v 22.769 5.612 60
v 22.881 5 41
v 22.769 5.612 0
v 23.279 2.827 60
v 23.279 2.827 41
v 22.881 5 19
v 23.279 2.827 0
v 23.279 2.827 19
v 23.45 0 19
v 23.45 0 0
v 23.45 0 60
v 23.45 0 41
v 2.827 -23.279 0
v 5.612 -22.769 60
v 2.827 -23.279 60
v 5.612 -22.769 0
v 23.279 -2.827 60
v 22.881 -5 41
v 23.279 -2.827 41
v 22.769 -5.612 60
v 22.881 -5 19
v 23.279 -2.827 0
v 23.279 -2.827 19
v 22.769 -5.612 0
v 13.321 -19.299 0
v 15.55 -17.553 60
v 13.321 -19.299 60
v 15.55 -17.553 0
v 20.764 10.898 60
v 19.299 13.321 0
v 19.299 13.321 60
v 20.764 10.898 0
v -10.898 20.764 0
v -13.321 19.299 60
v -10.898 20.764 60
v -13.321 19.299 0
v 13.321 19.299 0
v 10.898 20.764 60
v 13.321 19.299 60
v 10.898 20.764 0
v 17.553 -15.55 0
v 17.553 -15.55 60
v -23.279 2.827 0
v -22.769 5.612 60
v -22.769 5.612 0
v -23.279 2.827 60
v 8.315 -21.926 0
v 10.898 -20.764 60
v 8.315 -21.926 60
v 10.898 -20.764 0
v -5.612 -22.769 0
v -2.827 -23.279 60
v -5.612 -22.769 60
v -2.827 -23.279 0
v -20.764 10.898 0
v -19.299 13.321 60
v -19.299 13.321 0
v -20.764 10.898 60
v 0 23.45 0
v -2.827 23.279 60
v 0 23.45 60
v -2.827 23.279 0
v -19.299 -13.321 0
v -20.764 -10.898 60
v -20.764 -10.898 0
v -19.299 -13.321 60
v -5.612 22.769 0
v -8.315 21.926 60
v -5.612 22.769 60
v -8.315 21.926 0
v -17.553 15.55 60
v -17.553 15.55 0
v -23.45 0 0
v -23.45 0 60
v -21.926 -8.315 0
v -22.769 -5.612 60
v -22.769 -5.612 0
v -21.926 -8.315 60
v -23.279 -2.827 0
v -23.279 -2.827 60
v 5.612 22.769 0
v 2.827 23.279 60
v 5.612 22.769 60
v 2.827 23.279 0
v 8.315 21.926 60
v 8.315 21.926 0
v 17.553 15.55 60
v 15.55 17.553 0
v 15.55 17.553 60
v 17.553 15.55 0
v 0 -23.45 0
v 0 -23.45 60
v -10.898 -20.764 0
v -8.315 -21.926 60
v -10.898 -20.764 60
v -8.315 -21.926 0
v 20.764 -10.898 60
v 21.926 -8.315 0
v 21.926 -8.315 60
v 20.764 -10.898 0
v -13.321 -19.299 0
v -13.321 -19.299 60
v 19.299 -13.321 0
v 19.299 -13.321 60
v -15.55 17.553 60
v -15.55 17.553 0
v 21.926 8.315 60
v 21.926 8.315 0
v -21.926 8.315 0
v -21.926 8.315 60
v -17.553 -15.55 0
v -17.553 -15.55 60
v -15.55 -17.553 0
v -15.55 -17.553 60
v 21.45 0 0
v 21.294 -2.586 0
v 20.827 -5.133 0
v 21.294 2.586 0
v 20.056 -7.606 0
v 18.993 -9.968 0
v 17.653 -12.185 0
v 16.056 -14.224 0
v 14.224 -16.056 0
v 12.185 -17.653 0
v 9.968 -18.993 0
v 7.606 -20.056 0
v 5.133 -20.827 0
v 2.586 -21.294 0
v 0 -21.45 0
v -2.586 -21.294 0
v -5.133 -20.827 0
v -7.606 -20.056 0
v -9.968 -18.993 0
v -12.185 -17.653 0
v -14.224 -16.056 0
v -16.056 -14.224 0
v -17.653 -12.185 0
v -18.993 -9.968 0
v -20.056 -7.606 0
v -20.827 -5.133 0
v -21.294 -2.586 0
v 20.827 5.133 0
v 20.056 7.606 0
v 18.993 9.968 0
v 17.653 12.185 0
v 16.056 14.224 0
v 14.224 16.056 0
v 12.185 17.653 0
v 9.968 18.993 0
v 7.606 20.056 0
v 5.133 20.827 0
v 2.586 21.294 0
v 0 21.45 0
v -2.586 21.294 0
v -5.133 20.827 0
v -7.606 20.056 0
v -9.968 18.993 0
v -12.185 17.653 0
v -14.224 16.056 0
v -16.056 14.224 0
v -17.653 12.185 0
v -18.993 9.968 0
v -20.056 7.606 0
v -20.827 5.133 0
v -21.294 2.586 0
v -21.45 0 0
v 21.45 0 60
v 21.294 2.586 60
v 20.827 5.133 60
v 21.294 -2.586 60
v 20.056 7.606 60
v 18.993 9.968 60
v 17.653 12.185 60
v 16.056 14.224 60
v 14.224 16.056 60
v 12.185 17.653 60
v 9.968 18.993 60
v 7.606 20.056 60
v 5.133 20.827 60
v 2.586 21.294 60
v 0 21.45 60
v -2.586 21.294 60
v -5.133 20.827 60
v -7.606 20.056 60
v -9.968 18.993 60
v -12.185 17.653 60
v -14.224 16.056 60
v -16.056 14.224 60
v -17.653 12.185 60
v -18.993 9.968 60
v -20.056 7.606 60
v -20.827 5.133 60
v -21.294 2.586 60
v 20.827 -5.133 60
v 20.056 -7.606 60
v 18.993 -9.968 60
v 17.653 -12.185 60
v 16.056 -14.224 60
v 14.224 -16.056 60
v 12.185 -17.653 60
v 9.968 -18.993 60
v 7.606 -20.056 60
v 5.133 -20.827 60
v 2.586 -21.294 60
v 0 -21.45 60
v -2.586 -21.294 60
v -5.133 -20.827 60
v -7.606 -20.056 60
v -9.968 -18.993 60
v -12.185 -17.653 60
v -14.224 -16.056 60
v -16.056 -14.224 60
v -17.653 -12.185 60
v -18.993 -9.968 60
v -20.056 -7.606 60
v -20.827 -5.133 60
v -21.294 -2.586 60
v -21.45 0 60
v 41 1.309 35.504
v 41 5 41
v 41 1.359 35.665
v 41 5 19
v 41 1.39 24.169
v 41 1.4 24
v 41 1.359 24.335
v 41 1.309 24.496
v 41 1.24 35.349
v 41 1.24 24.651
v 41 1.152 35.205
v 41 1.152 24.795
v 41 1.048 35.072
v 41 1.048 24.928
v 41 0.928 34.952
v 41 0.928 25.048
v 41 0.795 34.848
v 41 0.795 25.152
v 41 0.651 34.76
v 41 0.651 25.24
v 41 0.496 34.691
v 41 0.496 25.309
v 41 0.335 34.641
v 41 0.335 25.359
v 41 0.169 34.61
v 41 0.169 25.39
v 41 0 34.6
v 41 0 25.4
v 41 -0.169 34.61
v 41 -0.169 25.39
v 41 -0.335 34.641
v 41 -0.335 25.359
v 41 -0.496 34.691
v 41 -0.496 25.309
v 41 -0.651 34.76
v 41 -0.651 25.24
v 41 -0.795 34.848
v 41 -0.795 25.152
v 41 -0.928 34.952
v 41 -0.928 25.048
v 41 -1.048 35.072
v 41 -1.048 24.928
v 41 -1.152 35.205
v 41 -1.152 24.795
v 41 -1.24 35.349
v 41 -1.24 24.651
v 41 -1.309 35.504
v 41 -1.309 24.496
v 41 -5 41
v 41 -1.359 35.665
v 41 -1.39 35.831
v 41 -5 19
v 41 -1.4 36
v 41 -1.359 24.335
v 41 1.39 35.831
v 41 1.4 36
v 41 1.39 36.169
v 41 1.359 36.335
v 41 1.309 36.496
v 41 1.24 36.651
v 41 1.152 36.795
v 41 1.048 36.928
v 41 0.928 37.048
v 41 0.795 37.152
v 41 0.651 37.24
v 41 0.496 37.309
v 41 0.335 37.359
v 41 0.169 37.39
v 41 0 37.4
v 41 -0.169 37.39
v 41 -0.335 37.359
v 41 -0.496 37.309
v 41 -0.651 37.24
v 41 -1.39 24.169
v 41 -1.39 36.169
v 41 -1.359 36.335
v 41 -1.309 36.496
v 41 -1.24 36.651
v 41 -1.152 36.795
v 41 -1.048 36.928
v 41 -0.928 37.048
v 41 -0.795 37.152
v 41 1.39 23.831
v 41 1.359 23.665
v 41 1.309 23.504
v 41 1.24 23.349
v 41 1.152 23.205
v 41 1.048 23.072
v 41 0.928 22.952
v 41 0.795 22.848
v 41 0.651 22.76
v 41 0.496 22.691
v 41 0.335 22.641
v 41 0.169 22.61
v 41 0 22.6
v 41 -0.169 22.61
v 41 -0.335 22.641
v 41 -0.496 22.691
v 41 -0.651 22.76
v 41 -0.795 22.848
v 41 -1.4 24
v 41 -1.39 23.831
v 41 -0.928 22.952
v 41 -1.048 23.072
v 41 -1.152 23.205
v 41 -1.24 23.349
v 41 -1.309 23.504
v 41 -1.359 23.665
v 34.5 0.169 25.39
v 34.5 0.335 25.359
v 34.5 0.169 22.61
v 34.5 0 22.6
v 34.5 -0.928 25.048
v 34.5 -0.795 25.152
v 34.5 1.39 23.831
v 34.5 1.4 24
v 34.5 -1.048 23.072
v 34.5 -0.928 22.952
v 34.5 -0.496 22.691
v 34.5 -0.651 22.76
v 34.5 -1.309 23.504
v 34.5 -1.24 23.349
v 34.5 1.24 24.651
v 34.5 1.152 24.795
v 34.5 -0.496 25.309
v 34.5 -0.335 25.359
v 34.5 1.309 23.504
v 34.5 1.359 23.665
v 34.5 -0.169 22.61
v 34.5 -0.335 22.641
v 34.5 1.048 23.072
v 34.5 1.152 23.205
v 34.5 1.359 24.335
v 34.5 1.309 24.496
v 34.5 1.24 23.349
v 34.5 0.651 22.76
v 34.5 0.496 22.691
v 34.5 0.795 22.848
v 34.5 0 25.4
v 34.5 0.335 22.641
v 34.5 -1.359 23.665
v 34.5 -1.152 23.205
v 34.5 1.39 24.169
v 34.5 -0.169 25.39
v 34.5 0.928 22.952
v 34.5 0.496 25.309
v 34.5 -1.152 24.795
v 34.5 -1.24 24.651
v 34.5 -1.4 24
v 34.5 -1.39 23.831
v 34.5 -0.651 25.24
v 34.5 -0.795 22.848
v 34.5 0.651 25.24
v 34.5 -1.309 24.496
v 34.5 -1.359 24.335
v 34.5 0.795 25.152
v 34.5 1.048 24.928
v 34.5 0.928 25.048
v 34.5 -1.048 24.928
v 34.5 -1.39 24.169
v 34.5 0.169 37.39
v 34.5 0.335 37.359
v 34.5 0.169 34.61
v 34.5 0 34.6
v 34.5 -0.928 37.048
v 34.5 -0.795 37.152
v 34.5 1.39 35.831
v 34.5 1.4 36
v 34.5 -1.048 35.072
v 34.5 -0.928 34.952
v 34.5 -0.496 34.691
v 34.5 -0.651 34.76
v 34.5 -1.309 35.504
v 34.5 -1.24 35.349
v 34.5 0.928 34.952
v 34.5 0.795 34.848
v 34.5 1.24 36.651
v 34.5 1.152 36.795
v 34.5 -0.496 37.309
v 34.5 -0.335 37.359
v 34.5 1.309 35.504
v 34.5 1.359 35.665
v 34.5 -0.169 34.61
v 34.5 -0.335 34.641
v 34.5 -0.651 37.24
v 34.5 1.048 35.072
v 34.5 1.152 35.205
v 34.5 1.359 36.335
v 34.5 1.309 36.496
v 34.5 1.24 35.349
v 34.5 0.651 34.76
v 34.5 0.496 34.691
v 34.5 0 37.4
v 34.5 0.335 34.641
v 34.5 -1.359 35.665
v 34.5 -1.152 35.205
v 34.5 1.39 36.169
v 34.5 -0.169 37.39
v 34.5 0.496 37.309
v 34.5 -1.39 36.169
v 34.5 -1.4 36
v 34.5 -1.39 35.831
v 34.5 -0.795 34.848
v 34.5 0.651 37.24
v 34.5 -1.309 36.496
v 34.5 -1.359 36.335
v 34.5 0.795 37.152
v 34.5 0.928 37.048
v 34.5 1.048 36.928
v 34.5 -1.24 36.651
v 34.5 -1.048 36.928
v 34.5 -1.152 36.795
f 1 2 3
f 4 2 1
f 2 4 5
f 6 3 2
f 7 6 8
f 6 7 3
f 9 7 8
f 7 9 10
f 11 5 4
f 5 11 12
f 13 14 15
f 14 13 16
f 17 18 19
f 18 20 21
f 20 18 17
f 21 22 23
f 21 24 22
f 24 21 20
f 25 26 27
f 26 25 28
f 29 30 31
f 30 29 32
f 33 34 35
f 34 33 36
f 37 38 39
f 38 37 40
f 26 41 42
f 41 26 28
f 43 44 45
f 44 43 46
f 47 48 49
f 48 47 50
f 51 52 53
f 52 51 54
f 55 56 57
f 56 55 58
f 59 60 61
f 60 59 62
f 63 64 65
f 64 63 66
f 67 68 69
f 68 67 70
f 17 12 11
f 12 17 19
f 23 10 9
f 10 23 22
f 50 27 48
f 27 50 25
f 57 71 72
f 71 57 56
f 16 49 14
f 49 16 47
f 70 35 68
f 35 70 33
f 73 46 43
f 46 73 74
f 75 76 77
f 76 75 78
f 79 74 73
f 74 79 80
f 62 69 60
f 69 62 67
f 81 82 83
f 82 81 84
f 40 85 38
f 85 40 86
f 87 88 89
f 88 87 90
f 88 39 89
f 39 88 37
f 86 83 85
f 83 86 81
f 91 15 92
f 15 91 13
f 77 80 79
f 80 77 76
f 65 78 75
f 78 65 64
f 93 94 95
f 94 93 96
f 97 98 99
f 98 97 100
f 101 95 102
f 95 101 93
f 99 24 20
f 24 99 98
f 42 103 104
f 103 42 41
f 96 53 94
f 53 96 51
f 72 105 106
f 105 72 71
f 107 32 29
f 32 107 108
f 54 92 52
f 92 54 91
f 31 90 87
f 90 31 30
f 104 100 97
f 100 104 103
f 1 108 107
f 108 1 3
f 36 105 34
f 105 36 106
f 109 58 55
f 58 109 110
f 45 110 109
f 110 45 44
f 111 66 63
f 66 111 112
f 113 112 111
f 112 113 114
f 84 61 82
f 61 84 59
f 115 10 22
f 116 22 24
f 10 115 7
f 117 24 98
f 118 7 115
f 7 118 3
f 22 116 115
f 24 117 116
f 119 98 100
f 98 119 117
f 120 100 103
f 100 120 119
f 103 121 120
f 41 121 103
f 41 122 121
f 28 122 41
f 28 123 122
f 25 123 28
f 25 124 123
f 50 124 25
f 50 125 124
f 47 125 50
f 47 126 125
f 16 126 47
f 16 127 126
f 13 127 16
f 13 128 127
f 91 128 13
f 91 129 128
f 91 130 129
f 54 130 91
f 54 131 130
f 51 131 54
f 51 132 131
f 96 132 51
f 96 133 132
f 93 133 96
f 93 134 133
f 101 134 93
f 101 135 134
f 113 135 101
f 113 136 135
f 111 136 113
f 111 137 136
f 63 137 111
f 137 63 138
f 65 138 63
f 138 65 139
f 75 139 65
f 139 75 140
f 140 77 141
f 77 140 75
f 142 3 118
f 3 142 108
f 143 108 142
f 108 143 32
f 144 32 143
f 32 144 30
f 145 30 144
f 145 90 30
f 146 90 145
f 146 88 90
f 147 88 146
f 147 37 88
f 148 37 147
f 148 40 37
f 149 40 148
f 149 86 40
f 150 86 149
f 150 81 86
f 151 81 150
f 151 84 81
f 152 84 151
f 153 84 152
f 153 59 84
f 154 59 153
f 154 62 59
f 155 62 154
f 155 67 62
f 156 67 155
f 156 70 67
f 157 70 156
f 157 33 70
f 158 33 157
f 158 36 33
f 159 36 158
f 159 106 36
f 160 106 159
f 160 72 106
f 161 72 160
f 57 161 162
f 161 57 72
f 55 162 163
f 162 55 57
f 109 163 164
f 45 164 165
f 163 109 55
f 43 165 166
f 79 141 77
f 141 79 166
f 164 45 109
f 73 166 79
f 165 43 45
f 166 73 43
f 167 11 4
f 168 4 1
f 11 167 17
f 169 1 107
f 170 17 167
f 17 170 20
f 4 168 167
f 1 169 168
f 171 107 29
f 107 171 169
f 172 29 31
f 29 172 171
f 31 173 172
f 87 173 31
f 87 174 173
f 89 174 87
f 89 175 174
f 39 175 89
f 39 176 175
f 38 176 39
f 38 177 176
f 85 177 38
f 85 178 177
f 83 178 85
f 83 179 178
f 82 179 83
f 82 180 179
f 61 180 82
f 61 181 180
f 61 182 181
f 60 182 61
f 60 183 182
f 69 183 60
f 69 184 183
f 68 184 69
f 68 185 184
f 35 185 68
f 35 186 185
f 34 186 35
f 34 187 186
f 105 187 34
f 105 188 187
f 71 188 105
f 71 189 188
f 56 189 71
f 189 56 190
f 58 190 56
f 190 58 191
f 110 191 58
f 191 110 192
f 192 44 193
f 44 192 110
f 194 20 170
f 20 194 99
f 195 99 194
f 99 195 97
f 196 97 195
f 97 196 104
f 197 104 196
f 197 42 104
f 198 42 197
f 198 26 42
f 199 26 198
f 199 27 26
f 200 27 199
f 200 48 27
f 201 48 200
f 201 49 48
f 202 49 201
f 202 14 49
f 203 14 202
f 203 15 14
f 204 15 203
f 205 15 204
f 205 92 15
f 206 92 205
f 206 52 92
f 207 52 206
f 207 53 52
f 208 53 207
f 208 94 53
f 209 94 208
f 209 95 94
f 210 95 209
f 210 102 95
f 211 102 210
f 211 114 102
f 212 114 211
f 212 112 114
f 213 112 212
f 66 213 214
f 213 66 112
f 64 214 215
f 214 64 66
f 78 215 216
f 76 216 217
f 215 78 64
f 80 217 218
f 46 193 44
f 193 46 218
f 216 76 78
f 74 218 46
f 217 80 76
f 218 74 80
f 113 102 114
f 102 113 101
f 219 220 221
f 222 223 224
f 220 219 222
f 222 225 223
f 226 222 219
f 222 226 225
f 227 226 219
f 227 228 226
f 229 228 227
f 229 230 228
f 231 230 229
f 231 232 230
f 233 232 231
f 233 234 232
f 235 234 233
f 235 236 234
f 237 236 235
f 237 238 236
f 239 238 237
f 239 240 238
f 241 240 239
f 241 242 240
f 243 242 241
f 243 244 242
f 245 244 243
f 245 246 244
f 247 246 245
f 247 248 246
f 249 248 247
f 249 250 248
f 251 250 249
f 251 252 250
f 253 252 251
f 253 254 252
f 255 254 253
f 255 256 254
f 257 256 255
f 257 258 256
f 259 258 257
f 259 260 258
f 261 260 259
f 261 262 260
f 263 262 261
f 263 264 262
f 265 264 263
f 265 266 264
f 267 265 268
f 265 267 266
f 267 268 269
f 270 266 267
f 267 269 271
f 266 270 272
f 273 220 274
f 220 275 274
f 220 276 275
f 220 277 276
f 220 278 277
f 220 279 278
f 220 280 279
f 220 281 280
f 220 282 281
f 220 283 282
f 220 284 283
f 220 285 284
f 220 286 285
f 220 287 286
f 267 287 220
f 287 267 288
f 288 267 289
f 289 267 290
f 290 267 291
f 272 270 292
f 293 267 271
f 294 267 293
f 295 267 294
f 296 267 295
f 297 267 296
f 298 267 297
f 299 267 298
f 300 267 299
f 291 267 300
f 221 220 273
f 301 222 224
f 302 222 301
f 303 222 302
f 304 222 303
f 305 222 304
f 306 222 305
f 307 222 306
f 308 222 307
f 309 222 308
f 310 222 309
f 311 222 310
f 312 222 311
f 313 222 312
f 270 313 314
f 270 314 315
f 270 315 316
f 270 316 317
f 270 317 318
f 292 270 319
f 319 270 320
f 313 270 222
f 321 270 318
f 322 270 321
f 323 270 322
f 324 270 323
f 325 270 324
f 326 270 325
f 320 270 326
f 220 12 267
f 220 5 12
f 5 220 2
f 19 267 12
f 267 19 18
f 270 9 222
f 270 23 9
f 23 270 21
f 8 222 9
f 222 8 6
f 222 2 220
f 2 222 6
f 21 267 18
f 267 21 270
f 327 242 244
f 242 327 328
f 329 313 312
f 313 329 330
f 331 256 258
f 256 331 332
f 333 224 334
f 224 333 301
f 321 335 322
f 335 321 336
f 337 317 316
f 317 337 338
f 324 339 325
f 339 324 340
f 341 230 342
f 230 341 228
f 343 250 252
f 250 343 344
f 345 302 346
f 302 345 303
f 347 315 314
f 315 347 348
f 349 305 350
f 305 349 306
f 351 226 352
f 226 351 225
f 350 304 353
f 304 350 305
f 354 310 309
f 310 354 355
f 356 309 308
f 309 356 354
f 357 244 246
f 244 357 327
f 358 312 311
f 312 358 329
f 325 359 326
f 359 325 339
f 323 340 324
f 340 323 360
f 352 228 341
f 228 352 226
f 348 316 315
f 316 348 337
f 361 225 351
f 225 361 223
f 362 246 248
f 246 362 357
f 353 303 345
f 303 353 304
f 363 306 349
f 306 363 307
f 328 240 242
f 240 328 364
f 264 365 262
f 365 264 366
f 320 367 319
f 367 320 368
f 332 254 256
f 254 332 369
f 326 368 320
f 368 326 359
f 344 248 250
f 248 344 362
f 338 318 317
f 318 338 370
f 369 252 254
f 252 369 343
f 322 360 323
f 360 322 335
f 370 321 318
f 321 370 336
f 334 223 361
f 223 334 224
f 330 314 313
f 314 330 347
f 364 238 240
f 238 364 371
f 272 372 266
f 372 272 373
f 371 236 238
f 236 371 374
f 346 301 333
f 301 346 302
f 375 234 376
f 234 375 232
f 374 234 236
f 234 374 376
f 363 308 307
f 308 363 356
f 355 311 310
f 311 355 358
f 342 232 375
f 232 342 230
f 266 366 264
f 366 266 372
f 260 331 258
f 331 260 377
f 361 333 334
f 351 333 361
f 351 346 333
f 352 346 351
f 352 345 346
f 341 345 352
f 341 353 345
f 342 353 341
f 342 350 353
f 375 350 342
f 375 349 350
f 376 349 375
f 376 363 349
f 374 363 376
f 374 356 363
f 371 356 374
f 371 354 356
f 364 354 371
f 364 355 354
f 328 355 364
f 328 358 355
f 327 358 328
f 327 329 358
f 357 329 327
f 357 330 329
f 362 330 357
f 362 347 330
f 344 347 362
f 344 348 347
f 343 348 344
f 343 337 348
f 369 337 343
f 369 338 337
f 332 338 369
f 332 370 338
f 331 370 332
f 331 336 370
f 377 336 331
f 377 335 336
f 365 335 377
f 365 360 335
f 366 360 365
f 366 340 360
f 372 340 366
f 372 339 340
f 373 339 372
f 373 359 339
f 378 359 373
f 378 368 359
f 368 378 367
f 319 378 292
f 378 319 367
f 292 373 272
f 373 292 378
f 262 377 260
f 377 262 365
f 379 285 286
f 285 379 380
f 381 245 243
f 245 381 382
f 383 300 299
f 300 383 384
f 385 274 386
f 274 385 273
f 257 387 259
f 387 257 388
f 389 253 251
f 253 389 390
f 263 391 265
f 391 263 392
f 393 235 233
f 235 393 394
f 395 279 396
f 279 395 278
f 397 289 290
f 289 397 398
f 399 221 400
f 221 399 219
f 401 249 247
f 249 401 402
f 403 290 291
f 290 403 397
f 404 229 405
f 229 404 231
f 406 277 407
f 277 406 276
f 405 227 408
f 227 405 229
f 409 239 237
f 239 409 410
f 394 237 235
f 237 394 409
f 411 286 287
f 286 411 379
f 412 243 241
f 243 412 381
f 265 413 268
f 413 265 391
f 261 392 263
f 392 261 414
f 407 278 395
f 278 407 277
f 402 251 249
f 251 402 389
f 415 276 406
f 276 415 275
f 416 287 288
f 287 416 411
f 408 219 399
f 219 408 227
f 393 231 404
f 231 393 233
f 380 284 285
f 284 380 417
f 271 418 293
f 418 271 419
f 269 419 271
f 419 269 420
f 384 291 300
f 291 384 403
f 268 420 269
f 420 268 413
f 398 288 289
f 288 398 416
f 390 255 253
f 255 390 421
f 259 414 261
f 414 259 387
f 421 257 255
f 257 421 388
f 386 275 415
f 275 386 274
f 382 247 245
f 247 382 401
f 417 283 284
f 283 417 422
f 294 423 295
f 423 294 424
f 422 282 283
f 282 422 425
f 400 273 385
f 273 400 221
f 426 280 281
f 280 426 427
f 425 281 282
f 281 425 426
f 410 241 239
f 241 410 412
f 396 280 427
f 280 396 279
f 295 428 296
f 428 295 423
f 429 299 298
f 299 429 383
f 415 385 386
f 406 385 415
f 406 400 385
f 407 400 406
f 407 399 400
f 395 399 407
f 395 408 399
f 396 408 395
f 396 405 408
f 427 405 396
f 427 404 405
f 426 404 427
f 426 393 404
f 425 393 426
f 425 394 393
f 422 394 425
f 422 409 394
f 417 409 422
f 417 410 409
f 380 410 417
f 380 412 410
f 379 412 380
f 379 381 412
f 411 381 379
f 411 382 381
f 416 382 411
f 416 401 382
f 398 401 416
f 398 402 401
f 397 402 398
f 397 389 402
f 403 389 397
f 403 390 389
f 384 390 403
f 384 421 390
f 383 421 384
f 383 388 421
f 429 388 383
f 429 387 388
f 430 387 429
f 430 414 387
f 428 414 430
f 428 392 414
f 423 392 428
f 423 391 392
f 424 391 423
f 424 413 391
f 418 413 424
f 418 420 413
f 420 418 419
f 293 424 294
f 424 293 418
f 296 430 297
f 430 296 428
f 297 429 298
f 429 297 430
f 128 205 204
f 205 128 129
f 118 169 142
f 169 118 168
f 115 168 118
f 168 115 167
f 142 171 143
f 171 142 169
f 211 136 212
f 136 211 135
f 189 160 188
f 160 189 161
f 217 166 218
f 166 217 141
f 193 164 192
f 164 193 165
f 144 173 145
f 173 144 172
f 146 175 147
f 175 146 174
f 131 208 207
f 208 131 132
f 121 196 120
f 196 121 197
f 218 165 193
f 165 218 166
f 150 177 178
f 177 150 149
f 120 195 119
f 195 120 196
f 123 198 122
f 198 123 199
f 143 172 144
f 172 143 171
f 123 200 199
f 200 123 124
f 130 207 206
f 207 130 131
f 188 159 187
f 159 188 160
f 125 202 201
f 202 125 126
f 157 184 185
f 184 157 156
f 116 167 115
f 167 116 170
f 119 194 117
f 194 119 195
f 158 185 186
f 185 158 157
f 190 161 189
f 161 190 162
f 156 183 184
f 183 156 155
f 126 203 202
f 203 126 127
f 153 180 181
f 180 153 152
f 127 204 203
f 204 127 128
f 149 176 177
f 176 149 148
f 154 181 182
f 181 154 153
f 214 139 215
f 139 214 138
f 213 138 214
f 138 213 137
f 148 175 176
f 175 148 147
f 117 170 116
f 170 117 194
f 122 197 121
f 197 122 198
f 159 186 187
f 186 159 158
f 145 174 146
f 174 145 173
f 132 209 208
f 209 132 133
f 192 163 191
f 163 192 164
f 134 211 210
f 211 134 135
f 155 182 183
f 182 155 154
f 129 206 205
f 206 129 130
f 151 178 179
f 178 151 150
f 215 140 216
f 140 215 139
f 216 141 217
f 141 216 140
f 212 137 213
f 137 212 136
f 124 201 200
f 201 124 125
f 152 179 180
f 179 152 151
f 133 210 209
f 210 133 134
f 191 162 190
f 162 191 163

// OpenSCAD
$fn = 52;

r1i = ( 42.5+0.4 ) / 2;
r1o = r1i + 2.0;
h1 = 60.0;

difference() {
  union() {
  cylinder( r=r1o, h= 60.0 );
  translate([31,0,30])
  cube ([20,10,22],true);
  }
  translate([34.5,0,24])
  rotate([0,90,0])
  cylinder(r=1.4, h=7);
  translate([34.5,0,36])
  rotate([0,90,0])
  cylinder(r=1.4, h=7);

  cylinder( r=r1i, h= 60.0+0.1 );
}

//translate([50,0,0] ) {
//difference() {
//  cylinder( r=r1i-0.2, h= 3.0 );
//  cylinder( r=r1i-2.0, h= 3.0+0.1 );
//}
//}
